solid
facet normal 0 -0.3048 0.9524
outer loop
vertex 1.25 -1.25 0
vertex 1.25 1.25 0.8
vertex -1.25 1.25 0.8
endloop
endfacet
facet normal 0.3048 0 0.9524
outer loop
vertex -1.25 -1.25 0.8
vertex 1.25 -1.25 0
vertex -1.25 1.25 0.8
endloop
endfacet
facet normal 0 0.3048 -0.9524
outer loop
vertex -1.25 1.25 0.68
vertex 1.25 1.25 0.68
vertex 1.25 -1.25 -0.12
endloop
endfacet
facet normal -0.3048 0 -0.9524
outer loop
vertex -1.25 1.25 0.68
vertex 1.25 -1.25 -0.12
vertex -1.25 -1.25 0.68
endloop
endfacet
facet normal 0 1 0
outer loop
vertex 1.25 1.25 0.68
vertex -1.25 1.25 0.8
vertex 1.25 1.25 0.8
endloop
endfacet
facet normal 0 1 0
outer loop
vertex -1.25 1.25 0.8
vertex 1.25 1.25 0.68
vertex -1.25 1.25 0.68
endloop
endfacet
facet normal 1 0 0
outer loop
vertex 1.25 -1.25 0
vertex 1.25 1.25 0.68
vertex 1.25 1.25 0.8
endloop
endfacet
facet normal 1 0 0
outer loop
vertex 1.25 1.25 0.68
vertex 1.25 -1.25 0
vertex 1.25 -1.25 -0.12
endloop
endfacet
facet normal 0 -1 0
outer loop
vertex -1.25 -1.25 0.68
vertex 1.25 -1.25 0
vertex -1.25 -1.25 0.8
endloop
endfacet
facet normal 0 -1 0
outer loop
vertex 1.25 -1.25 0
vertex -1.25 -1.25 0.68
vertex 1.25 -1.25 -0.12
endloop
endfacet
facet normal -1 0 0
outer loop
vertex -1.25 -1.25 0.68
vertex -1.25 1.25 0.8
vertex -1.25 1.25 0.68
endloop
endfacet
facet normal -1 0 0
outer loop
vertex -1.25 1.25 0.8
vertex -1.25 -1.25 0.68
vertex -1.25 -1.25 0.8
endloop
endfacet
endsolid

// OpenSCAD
// Shed shell kit: roof valley. See lib/lodge_kit.scad.
include <lib/lodge_kit.scad>
kind = "shed";
roof_tile([1, 1, 0, 1], 0);
